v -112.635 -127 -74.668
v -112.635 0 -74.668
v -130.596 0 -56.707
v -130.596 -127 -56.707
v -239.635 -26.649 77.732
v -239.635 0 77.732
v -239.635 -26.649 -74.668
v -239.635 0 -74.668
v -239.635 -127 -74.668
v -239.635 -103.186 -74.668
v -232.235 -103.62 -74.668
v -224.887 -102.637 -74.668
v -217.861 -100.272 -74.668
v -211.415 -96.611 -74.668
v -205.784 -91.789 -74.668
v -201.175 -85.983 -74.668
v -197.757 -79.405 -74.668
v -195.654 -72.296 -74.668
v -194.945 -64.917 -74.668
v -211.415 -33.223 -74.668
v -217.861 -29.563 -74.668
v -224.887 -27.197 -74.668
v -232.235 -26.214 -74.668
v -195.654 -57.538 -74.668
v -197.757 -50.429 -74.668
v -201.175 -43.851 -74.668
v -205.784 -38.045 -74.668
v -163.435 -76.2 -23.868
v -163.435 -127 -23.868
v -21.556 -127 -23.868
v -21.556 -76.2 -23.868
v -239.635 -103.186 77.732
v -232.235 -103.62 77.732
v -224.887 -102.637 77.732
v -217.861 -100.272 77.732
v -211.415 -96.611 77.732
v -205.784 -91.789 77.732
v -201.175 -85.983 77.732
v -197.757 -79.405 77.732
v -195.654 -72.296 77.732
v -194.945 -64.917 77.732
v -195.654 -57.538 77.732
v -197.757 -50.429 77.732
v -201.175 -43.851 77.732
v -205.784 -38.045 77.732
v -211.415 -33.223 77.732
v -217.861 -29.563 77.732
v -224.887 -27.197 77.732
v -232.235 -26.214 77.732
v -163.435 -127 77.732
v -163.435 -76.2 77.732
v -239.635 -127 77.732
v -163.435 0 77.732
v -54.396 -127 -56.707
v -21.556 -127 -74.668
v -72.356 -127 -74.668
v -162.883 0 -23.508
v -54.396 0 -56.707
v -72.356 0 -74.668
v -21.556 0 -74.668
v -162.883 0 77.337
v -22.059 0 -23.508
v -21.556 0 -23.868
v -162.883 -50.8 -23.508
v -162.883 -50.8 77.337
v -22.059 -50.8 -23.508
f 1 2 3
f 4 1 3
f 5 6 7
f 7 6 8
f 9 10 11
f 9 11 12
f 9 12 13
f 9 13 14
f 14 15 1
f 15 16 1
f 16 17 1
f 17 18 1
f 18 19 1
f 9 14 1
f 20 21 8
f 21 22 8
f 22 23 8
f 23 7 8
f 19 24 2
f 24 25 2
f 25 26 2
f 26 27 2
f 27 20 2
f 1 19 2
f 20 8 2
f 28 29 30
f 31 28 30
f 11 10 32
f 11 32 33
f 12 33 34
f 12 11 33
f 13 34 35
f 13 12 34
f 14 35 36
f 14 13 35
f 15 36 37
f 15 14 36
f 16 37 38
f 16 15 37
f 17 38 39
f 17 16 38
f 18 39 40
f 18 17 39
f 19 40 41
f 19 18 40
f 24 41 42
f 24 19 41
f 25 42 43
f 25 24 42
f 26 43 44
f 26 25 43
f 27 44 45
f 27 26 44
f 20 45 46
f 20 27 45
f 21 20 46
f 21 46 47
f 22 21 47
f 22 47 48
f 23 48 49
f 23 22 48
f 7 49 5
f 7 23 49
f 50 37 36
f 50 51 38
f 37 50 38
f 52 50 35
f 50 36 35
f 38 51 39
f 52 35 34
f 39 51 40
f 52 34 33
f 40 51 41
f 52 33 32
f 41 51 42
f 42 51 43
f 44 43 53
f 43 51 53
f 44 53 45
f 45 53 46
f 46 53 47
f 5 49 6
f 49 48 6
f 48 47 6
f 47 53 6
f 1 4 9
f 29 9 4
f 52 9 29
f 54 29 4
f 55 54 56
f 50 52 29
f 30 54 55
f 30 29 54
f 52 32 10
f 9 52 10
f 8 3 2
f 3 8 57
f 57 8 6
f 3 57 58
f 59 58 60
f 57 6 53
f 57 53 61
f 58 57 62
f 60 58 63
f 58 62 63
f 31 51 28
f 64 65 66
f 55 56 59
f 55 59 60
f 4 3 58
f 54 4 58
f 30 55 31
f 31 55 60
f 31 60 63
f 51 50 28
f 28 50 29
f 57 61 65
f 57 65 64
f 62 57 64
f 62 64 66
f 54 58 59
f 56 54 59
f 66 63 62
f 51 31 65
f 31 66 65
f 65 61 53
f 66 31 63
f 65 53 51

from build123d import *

# Parameters (mm, degrees)
F1_DEPTH = 127
F2_R     = 38.7298959395
F3_DEPTH = 127
F4_DEPTH = 127
F5_DEPTH = 127
F7_DEPTH = 50.8
F9_DEPTH = 50.8


with BuildPart() as f1:
    # F0 (on Front) → F1 (new body)
    with BuildSketch(Plane.XZ):
        Polygon((-163.7962559972, -23.8678936321), (-163.4352315129, 77.7321063679), (-239.6352315129, 77.7321063679), (-239.6352315129, -74.6678936321), (-112.6352315129, -74.6678936321), (-130.5957437551, -56.70738139), (-54.3957437551, -56.70738139), (-72.3562559972, -74.6678936321), (-21.5562559972, -74.6678936321), (-21.5562559972, -23.8678936321), align=None)
    extrude(amount=F1_DEPTH)

    # F2 (on Top) → F3 (cut)
    with BuildSketch(Plane.XY):
        with Locations((-233.6748705878, -64.917108044)):
            Circle(F2_R)
    extrude(amount=F3_DEPTH, mode=Mode.SUBTRACT)

    # F4 (cut): a face of the model
    f4_faces = [f1.faces().sort_by_distance(p)[0] for p in [
        (-220.4073030245, -64.917108044, 0),
    ]]
    extrude(f4_faces, amount=-F4_DEPTH, mode=Mode.SUBTRACT)

    # F0 (on Front) → F5 (join)
    with BuildSketch(Plane.XZ):
        Polygon((-21.5562559972, -23.8678936321), (-163.4352315129, 77.7321063679), (-163.7962559972, -23.8678936321), align=None)
    extrude(amount=F5_DEPTH)

    # F6 (on face) → F7 (cut)
    with BuildSketch(Plane.XZ.offset(127)):
        Polygon((-21.5562559972, -23.8678936321), (-163.4352315129, 77.7321063679), (-163.4352315129, -23.8678936321), align=None)
    extrude(amount=-F7_DEPTH, mode=Mode.SUBTRACT)

    # F8 (on face) → F9 (cut)
    with BuildSketch(Plane.XZ):
        Polygon((-162.8829091787, -23.5076323152), (-20.4247385263, -23.5076323152), (-162.8829091787, 78.0534595251), align=None)
    extrude(amount=F9_DEPTH, mode=Mode.SUBTRACT)


solid = f1.part
